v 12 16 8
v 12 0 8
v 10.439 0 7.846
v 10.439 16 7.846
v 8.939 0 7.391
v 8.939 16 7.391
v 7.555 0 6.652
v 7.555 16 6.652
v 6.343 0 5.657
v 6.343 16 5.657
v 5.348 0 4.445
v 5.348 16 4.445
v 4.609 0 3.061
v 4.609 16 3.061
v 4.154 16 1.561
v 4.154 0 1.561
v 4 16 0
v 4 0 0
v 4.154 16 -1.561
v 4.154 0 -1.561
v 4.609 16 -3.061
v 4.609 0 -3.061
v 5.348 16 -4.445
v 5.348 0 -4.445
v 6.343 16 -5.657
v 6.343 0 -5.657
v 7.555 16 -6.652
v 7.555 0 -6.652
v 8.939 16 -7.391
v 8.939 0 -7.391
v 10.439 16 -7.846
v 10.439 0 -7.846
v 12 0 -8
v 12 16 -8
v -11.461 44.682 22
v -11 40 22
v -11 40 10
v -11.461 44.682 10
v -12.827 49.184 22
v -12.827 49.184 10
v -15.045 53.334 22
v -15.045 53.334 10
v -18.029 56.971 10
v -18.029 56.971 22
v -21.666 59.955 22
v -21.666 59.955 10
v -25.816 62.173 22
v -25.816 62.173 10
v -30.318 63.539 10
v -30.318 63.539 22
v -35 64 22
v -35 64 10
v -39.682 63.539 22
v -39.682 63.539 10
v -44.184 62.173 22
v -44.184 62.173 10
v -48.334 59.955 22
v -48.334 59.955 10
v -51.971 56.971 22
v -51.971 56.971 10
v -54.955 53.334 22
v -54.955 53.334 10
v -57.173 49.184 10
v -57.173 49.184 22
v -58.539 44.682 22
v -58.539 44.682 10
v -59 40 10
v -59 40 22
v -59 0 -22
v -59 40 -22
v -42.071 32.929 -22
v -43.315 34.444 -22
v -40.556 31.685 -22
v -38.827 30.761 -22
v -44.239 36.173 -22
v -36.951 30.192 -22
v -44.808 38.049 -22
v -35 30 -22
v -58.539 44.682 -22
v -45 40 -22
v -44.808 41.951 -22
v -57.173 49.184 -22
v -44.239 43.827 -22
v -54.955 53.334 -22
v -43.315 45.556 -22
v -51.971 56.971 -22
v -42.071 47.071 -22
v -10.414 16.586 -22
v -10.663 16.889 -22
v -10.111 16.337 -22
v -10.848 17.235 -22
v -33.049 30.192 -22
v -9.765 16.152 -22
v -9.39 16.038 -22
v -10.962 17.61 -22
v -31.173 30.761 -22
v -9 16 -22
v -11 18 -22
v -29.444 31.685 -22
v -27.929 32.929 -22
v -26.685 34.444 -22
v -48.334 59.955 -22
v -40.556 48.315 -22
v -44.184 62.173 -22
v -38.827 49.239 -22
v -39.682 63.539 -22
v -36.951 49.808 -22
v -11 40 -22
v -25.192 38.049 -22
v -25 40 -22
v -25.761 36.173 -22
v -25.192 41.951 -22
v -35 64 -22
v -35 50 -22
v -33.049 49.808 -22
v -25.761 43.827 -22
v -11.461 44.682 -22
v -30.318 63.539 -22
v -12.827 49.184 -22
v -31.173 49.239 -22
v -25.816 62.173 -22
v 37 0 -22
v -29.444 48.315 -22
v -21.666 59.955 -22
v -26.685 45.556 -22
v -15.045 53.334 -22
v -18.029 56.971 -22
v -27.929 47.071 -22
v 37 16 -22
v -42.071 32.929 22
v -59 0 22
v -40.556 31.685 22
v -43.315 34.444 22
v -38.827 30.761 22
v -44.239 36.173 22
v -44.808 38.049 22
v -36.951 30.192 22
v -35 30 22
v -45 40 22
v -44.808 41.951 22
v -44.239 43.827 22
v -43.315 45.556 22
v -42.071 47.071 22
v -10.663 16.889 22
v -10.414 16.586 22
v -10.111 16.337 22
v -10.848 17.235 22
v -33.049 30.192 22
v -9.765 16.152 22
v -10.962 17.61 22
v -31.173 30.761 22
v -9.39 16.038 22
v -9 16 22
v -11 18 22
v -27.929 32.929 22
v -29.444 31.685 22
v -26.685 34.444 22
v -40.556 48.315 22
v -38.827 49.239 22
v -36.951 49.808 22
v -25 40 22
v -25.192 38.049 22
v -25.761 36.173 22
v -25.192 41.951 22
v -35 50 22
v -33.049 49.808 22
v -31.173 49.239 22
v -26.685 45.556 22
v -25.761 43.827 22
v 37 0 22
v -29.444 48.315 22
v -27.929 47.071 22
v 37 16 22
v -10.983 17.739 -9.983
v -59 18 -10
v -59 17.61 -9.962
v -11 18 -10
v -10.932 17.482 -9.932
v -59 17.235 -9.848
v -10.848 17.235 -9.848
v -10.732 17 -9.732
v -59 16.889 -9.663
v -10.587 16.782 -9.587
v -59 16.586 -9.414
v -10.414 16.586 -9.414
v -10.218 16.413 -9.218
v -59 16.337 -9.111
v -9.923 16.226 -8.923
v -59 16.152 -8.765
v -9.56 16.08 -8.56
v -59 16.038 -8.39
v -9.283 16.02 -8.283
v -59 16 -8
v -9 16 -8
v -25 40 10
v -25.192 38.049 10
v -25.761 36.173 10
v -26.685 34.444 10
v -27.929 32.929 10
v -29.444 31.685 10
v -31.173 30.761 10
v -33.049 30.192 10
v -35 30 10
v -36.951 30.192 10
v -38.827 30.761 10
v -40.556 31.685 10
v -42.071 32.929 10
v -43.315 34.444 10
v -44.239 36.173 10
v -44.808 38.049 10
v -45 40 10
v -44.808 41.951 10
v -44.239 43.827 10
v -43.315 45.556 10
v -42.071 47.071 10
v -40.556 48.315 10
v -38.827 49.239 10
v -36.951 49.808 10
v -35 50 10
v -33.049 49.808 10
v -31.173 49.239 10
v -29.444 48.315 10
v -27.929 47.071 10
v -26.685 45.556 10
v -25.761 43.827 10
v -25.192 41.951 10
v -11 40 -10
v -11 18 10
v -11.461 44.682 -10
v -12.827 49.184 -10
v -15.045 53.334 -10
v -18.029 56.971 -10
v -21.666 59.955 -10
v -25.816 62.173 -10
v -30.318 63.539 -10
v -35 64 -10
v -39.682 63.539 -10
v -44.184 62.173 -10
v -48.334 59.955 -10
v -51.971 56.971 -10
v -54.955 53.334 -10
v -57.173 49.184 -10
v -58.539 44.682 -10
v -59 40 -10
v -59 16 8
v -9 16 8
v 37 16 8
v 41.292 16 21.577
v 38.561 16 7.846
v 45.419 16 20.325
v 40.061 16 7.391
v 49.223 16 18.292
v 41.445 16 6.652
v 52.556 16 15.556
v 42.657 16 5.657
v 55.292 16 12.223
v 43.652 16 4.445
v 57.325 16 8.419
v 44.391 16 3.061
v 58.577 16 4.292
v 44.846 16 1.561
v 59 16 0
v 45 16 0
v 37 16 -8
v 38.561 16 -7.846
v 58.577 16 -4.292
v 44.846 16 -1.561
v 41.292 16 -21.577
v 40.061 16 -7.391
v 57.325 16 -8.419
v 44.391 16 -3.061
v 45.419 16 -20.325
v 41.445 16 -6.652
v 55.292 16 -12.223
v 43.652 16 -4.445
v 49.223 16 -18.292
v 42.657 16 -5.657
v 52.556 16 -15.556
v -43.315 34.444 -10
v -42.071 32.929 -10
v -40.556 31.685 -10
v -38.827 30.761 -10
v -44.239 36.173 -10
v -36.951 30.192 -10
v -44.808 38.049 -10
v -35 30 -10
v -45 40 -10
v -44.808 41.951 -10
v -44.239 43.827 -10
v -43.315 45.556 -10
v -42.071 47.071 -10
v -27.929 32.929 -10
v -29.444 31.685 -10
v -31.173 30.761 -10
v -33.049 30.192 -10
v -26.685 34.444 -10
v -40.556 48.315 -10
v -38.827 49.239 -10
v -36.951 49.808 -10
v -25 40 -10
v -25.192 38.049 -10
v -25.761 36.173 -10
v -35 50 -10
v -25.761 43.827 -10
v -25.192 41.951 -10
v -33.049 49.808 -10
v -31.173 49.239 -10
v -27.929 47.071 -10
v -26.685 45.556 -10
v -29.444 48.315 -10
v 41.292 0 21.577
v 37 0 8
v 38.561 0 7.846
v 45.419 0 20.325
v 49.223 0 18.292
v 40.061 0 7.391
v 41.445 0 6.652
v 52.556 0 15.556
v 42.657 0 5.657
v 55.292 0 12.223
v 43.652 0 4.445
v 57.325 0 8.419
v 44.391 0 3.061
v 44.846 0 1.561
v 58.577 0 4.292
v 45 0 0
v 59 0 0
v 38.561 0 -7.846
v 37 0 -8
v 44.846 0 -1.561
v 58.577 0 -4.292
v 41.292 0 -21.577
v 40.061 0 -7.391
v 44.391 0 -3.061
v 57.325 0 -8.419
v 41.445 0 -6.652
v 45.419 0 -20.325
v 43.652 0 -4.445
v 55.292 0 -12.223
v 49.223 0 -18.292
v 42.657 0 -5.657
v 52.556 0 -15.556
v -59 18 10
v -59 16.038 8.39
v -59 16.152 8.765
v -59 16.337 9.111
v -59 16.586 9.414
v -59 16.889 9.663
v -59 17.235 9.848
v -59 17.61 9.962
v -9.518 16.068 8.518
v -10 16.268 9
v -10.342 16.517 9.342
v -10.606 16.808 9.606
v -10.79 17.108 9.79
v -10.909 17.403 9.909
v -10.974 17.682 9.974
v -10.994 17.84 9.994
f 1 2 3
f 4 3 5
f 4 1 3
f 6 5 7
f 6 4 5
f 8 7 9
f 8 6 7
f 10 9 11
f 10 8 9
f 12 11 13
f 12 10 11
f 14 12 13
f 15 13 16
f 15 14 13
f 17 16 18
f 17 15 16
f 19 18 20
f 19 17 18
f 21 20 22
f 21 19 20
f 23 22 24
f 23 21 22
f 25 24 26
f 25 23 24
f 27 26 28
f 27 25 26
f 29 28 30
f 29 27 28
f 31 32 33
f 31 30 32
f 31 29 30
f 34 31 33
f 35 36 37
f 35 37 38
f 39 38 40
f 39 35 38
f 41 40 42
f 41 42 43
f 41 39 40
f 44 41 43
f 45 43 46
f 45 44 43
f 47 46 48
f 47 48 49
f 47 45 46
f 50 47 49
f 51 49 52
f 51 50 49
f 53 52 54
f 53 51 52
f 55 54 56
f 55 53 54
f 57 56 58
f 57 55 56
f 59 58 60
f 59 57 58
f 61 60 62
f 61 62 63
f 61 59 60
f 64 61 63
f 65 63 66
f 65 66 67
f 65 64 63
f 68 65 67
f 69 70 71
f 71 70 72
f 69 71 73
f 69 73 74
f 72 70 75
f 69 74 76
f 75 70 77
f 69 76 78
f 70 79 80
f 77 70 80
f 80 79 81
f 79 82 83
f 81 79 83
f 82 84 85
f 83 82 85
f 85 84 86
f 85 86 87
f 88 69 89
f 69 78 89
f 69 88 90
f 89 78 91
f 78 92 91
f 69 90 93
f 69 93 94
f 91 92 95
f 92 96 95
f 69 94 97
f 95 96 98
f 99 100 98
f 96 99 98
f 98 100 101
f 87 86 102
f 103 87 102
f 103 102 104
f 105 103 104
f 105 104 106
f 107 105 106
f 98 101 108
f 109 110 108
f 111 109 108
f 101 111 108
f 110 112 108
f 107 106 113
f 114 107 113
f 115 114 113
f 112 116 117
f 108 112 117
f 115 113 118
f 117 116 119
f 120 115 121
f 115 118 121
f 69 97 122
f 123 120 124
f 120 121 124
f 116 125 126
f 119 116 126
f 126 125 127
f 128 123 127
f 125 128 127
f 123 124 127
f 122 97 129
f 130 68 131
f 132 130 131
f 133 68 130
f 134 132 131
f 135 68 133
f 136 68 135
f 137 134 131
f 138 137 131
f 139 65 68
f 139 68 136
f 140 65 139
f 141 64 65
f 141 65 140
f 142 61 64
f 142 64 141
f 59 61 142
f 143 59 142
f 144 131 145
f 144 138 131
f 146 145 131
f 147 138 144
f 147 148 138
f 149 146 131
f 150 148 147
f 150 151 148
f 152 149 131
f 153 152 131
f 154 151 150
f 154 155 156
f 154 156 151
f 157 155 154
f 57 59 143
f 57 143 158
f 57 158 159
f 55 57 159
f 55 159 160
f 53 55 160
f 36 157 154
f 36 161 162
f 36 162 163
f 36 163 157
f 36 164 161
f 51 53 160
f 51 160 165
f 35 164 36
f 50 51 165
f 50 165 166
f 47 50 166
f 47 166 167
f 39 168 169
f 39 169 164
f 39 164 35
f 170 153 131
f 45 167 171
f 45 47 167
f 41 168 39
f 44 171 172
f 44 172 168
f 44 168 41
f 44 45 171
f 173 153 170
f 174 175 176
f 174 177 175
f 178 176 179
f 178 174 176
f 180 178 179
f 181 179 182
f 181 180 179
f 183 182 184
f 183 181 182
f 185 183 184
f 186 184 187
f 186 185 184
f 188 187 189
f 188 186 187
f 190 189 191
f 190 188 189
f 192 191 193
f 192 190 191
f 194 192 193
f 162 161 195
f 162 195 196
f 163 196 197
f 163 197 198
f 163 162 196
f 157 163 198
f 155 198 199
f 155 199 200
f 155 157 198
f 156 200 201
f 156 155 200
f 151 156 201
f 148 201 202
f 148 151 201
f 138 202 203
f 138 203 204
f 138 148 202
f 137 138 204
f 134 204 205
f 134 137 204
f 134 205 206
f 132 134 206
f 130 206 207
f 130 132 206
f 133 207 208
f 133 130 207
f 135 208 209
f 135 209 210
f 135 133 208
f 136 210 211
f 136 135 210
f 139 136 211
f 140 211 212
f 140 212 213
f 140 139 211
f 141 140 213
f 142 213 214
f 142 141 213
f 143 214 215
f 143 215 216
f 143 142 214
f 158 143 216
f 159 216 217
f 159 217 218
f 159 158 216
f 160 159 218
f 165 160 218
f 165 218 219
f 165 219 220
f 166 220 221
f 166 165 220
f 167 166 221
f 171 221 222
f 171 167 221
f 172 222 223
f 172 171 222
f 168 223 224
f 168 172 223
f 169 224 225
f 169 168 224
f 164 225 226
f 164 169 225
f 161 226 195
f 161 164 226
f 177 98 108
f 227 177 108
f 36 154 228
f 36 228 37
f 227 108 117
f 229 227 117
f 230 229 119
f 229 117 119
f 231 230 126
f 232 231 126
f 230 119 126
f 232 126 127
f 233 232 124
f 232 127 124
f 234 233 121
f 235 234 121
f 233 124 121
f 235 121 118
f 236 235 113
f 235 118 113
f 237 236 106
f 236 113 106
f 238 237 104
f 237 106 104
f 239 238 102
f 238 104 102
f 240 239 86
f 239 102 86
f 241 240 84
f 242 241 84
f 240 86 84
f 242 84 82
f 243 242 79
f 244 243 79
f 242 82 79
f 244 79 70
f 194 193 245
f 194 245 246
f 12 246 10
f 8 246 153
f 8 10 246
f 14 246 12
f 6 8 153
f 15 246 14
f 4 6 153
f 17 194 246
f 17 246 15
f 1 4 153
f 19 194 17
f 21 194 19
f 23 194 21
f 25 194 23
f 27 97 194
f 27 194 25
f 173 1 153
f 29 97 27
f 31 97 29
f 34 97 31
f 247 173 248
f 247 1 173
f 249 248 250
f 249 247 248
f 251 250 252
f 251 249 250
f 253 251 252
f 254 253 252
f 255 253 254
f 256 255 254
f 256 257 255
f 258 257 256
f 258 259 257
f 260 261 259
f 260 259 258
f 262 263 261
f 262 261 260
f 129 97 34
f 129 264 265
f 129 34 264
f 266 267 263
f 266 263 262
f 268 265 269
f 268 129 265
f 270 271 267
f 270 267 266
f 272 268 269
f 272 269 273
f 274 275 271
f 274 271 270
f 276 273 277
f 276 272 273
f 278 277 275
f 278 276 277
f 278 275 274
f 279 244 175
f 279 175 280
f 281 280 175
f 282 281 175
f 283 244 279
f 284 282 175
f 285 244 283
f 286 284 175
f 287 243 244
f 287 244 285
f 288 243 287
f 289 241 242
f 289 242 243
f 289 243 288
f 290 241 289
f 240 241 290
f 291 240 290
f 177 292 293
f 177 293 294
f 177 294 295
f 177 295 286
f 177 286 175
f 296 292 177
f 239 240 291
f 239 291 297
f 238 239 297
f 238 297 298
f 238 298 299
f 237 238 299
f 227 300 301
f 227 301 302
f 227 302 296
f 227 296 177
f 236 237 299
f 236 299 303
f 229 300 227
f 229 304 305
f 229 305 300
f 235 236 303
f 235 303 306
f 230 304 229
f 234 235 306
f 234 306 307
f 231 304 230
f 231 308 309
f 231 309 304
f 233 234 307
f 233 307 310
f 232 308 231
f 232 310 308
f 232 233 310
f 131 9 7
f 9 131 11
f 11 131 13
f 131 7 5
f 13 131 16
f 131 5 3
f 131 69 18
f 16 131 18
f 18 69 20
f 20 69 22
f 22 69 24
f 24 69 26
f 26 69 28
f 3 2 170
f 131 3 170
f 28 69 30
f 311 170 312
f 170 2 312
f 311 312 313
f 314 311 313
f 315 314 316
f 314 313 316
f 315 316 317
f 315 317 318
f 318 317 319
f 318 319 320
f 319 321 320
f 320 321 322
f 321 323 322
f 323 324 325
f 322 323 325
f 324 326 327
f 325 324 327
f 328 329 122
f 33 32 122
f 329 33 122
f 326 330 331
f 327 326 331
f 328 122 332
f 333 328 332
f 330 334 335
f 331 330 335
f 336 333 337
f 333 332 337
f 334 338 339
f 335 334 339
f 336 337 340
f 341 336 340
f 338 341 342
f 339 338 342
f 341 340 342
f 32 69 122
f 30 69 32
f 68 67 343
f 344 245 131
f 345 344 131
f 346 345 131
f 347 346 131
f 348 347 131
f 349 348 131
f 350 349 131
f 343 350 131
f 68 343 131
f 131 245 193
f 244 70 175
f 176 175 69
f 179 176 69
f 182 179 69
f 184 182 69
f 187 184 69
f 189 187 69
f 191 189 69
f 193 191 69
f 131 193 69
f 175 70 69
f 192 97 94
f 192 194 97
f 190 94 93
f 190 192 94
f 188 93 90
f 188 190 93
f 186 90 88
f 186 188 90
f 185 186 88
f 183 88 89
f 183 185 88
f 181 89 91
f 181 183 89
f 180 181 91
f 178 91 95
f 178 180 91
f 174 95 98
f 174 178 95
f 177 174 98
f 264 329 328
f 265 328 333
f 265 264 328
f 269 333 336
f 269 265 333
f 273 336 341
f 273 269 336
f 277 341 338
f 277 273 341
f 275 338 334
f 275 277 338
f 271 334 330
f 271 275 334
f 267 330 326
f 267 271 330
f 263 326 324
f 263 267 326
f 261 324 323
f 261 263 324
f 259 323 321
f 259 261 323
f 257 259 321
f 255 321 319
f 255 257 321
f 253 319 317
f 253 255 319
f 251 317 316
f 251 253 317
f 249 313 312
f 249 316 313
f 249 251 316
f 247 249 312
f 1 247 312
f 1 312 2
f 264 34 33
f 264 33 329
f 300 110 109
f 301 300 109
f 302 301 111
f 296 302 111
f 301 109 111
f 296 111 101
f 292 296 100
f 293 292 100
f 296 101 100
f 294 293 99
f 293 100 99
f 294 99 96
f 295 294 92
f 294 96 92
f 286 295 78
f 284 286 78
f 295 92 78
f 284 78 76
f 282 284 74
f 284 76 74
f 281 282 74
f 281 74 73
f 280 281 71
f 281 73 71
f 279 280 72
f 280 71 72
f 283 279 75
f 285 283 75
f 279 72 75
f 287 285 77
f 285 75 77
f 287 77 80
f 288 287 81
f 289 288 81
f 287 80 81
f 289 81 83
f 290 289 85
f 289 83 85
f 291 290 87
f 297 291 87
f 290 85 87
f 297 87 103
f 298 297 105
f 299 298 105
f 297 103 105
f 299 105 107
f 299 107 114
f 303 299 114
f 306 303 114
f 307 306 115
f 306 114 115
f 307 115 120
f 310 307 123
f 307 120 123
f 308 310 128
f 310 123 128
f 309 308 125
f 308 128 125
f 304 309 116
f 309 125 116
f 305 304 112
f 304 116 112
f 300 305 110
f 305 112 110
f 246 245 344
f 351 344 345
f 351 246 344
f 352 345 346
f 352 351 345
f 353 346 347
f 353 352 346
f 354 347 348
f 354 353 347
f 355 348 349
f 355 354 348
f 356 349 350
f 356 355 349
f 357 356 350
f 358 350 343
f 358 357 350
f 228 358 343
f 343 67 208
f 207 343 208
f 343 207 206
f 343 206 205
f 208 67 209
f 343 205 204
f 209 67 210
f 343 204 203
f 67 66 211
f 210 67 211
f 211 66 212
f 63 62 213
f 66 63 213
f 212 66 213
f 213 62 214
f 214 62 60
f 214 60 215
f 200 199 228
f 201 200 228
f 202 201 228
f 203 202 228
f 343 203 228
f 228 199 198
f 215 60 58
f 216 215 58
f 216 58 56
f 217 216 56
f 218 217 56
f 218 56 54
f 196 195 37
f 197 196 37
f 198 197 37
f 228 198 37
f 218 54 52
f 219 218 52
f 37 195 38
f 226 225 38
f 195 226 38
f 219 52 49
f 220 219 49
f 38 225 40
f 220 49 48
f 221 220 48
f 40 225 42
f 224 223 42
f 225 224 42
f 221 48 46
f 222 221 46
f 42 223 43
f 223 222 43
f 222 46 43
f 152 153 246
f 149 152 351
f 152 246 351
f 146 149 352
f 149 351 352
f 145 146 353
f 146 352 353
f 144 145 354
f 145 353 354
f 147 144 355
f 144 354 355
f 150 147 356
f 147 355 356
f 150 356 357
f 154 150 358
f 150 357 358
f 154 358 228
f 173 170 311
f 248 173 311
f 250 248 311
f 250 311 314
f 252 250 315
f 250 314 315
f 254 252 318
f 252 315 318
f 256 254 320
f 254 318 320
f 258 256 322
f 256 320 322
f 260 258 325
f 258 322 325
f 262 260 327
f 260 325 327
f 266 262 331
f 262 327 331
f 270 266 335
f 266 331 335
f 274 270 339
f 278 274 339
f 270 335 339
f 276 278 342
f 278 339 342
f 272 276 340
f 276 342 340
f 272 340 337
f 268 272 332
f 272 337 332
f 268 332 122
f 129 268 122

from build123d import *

# Parameters (mm, degrees)
SKETCH2_R           = 22
BOSS_EXTRUDE1_DEPTH = 16
CUT_EXTRUDE1_DEPTH  = 17
BOSS_EXTRUDE2_DEPTH = 12
FILLET1_R           = 2


with BuildPart() as part:
    # Sketch2 → Boss-Extrude1 (new body)
    with BuildSketch(Plane(origin=(0, 0, 0), x_dir=(1, 0, 0), z_dir=(0, 1, 0))):
        with BuildLine():
            Line((37.000000064, 22), (-59, 22))
            Line((-59, 22), (-59, -22))
            Line((-59, -22), (37, -22))
            ThreePointArc((37, -22), (15, 3.2e-08), (37.000000064, 22))
        make_face()
        with Locations((37, 0)):
            Circle(SKETCH2_R)
    extrude(amount=BOSS_EXTRUDE1_DEPTH)

    # Sketch5 → Cut-Extrude1 (cut, through all)
    with BuildSketch(Plane(origin=(0, 16, 0), x_dir=(1, 0, 0), z_dir=(0, 1, 0))):
        with BuildLine():
            Line((37, -8), (12, -8))
            ThreePointArc((12, -8), (4, 0), (12, 8))
            Line((12, 8), (37, 8))
            ThreePointArc((37, 8), (45, 0), (37, -8))
        make_face()
    extrude(amount=-CUT_EXTRUDE1_DEPTH, mode=Mode.SUBTRACT)

    # Sketch6 → Boss-Extrude2 (add)
    with BuildSketch(Plane.XY.offset(22)):
        with BuildLine():
            ThreePointArc((-59, 40), (-51.970562748, 23.029437252), (-35, 16))
            ThreePointArc((-35, 16), (-18.029437252, 23.029437252), (-11, 40))
            Line((-11, 40), (-25, 40))
            ThreePointArc((-25, 40), (-35, 30), (-45, 40))
            Line((-45, 40), (-59, 40))
        make_face()
        with BuildLine():
            ThreePointArc((-11, 40), (-35, 64), (-59, 40))
            Line((-59, 40), (-45, 40))
            ThreePointArc((-45, 40), (-35, 50), (-25, 40))
            Line((-25, 40), (-11, 40))
        make_face()
        with BuildLine():
            ThreePointArc((-11, 40), (-18.029437252, 23.029437252), (-35, 16))
            Line((-35, 16), (-11, 16))
            Line((-11, 16), (-11, 40))
        make_face()
        with BuildLine():
            Line((-59, 40), (-59, 16))
            Line((-59, 16), (-35, 16))
            ThreePointArc((-35, 16), (-51.970562748, 23.029437252), (-59, 40))
        make_face()
    boss_extrude2 = extrude(amount=-BOSS_EXTRUDE2_DEPTH)

    # Mirror1: Boss-Extrude2 across plane
    add(boss_extrude2.mirror(Plane.XY))

    # Fillet1
    fillet1_edges = [part.edges().sort_by_distance(p)[0] for p in [
        (-11, 16, 16),
        (-35, 16, 10),
        (-35, 16, -10),
        (-11, 16, -16),
    ]]
    fillet(fillet1_edges, radius=FILLET1_R)


solid = part.part
